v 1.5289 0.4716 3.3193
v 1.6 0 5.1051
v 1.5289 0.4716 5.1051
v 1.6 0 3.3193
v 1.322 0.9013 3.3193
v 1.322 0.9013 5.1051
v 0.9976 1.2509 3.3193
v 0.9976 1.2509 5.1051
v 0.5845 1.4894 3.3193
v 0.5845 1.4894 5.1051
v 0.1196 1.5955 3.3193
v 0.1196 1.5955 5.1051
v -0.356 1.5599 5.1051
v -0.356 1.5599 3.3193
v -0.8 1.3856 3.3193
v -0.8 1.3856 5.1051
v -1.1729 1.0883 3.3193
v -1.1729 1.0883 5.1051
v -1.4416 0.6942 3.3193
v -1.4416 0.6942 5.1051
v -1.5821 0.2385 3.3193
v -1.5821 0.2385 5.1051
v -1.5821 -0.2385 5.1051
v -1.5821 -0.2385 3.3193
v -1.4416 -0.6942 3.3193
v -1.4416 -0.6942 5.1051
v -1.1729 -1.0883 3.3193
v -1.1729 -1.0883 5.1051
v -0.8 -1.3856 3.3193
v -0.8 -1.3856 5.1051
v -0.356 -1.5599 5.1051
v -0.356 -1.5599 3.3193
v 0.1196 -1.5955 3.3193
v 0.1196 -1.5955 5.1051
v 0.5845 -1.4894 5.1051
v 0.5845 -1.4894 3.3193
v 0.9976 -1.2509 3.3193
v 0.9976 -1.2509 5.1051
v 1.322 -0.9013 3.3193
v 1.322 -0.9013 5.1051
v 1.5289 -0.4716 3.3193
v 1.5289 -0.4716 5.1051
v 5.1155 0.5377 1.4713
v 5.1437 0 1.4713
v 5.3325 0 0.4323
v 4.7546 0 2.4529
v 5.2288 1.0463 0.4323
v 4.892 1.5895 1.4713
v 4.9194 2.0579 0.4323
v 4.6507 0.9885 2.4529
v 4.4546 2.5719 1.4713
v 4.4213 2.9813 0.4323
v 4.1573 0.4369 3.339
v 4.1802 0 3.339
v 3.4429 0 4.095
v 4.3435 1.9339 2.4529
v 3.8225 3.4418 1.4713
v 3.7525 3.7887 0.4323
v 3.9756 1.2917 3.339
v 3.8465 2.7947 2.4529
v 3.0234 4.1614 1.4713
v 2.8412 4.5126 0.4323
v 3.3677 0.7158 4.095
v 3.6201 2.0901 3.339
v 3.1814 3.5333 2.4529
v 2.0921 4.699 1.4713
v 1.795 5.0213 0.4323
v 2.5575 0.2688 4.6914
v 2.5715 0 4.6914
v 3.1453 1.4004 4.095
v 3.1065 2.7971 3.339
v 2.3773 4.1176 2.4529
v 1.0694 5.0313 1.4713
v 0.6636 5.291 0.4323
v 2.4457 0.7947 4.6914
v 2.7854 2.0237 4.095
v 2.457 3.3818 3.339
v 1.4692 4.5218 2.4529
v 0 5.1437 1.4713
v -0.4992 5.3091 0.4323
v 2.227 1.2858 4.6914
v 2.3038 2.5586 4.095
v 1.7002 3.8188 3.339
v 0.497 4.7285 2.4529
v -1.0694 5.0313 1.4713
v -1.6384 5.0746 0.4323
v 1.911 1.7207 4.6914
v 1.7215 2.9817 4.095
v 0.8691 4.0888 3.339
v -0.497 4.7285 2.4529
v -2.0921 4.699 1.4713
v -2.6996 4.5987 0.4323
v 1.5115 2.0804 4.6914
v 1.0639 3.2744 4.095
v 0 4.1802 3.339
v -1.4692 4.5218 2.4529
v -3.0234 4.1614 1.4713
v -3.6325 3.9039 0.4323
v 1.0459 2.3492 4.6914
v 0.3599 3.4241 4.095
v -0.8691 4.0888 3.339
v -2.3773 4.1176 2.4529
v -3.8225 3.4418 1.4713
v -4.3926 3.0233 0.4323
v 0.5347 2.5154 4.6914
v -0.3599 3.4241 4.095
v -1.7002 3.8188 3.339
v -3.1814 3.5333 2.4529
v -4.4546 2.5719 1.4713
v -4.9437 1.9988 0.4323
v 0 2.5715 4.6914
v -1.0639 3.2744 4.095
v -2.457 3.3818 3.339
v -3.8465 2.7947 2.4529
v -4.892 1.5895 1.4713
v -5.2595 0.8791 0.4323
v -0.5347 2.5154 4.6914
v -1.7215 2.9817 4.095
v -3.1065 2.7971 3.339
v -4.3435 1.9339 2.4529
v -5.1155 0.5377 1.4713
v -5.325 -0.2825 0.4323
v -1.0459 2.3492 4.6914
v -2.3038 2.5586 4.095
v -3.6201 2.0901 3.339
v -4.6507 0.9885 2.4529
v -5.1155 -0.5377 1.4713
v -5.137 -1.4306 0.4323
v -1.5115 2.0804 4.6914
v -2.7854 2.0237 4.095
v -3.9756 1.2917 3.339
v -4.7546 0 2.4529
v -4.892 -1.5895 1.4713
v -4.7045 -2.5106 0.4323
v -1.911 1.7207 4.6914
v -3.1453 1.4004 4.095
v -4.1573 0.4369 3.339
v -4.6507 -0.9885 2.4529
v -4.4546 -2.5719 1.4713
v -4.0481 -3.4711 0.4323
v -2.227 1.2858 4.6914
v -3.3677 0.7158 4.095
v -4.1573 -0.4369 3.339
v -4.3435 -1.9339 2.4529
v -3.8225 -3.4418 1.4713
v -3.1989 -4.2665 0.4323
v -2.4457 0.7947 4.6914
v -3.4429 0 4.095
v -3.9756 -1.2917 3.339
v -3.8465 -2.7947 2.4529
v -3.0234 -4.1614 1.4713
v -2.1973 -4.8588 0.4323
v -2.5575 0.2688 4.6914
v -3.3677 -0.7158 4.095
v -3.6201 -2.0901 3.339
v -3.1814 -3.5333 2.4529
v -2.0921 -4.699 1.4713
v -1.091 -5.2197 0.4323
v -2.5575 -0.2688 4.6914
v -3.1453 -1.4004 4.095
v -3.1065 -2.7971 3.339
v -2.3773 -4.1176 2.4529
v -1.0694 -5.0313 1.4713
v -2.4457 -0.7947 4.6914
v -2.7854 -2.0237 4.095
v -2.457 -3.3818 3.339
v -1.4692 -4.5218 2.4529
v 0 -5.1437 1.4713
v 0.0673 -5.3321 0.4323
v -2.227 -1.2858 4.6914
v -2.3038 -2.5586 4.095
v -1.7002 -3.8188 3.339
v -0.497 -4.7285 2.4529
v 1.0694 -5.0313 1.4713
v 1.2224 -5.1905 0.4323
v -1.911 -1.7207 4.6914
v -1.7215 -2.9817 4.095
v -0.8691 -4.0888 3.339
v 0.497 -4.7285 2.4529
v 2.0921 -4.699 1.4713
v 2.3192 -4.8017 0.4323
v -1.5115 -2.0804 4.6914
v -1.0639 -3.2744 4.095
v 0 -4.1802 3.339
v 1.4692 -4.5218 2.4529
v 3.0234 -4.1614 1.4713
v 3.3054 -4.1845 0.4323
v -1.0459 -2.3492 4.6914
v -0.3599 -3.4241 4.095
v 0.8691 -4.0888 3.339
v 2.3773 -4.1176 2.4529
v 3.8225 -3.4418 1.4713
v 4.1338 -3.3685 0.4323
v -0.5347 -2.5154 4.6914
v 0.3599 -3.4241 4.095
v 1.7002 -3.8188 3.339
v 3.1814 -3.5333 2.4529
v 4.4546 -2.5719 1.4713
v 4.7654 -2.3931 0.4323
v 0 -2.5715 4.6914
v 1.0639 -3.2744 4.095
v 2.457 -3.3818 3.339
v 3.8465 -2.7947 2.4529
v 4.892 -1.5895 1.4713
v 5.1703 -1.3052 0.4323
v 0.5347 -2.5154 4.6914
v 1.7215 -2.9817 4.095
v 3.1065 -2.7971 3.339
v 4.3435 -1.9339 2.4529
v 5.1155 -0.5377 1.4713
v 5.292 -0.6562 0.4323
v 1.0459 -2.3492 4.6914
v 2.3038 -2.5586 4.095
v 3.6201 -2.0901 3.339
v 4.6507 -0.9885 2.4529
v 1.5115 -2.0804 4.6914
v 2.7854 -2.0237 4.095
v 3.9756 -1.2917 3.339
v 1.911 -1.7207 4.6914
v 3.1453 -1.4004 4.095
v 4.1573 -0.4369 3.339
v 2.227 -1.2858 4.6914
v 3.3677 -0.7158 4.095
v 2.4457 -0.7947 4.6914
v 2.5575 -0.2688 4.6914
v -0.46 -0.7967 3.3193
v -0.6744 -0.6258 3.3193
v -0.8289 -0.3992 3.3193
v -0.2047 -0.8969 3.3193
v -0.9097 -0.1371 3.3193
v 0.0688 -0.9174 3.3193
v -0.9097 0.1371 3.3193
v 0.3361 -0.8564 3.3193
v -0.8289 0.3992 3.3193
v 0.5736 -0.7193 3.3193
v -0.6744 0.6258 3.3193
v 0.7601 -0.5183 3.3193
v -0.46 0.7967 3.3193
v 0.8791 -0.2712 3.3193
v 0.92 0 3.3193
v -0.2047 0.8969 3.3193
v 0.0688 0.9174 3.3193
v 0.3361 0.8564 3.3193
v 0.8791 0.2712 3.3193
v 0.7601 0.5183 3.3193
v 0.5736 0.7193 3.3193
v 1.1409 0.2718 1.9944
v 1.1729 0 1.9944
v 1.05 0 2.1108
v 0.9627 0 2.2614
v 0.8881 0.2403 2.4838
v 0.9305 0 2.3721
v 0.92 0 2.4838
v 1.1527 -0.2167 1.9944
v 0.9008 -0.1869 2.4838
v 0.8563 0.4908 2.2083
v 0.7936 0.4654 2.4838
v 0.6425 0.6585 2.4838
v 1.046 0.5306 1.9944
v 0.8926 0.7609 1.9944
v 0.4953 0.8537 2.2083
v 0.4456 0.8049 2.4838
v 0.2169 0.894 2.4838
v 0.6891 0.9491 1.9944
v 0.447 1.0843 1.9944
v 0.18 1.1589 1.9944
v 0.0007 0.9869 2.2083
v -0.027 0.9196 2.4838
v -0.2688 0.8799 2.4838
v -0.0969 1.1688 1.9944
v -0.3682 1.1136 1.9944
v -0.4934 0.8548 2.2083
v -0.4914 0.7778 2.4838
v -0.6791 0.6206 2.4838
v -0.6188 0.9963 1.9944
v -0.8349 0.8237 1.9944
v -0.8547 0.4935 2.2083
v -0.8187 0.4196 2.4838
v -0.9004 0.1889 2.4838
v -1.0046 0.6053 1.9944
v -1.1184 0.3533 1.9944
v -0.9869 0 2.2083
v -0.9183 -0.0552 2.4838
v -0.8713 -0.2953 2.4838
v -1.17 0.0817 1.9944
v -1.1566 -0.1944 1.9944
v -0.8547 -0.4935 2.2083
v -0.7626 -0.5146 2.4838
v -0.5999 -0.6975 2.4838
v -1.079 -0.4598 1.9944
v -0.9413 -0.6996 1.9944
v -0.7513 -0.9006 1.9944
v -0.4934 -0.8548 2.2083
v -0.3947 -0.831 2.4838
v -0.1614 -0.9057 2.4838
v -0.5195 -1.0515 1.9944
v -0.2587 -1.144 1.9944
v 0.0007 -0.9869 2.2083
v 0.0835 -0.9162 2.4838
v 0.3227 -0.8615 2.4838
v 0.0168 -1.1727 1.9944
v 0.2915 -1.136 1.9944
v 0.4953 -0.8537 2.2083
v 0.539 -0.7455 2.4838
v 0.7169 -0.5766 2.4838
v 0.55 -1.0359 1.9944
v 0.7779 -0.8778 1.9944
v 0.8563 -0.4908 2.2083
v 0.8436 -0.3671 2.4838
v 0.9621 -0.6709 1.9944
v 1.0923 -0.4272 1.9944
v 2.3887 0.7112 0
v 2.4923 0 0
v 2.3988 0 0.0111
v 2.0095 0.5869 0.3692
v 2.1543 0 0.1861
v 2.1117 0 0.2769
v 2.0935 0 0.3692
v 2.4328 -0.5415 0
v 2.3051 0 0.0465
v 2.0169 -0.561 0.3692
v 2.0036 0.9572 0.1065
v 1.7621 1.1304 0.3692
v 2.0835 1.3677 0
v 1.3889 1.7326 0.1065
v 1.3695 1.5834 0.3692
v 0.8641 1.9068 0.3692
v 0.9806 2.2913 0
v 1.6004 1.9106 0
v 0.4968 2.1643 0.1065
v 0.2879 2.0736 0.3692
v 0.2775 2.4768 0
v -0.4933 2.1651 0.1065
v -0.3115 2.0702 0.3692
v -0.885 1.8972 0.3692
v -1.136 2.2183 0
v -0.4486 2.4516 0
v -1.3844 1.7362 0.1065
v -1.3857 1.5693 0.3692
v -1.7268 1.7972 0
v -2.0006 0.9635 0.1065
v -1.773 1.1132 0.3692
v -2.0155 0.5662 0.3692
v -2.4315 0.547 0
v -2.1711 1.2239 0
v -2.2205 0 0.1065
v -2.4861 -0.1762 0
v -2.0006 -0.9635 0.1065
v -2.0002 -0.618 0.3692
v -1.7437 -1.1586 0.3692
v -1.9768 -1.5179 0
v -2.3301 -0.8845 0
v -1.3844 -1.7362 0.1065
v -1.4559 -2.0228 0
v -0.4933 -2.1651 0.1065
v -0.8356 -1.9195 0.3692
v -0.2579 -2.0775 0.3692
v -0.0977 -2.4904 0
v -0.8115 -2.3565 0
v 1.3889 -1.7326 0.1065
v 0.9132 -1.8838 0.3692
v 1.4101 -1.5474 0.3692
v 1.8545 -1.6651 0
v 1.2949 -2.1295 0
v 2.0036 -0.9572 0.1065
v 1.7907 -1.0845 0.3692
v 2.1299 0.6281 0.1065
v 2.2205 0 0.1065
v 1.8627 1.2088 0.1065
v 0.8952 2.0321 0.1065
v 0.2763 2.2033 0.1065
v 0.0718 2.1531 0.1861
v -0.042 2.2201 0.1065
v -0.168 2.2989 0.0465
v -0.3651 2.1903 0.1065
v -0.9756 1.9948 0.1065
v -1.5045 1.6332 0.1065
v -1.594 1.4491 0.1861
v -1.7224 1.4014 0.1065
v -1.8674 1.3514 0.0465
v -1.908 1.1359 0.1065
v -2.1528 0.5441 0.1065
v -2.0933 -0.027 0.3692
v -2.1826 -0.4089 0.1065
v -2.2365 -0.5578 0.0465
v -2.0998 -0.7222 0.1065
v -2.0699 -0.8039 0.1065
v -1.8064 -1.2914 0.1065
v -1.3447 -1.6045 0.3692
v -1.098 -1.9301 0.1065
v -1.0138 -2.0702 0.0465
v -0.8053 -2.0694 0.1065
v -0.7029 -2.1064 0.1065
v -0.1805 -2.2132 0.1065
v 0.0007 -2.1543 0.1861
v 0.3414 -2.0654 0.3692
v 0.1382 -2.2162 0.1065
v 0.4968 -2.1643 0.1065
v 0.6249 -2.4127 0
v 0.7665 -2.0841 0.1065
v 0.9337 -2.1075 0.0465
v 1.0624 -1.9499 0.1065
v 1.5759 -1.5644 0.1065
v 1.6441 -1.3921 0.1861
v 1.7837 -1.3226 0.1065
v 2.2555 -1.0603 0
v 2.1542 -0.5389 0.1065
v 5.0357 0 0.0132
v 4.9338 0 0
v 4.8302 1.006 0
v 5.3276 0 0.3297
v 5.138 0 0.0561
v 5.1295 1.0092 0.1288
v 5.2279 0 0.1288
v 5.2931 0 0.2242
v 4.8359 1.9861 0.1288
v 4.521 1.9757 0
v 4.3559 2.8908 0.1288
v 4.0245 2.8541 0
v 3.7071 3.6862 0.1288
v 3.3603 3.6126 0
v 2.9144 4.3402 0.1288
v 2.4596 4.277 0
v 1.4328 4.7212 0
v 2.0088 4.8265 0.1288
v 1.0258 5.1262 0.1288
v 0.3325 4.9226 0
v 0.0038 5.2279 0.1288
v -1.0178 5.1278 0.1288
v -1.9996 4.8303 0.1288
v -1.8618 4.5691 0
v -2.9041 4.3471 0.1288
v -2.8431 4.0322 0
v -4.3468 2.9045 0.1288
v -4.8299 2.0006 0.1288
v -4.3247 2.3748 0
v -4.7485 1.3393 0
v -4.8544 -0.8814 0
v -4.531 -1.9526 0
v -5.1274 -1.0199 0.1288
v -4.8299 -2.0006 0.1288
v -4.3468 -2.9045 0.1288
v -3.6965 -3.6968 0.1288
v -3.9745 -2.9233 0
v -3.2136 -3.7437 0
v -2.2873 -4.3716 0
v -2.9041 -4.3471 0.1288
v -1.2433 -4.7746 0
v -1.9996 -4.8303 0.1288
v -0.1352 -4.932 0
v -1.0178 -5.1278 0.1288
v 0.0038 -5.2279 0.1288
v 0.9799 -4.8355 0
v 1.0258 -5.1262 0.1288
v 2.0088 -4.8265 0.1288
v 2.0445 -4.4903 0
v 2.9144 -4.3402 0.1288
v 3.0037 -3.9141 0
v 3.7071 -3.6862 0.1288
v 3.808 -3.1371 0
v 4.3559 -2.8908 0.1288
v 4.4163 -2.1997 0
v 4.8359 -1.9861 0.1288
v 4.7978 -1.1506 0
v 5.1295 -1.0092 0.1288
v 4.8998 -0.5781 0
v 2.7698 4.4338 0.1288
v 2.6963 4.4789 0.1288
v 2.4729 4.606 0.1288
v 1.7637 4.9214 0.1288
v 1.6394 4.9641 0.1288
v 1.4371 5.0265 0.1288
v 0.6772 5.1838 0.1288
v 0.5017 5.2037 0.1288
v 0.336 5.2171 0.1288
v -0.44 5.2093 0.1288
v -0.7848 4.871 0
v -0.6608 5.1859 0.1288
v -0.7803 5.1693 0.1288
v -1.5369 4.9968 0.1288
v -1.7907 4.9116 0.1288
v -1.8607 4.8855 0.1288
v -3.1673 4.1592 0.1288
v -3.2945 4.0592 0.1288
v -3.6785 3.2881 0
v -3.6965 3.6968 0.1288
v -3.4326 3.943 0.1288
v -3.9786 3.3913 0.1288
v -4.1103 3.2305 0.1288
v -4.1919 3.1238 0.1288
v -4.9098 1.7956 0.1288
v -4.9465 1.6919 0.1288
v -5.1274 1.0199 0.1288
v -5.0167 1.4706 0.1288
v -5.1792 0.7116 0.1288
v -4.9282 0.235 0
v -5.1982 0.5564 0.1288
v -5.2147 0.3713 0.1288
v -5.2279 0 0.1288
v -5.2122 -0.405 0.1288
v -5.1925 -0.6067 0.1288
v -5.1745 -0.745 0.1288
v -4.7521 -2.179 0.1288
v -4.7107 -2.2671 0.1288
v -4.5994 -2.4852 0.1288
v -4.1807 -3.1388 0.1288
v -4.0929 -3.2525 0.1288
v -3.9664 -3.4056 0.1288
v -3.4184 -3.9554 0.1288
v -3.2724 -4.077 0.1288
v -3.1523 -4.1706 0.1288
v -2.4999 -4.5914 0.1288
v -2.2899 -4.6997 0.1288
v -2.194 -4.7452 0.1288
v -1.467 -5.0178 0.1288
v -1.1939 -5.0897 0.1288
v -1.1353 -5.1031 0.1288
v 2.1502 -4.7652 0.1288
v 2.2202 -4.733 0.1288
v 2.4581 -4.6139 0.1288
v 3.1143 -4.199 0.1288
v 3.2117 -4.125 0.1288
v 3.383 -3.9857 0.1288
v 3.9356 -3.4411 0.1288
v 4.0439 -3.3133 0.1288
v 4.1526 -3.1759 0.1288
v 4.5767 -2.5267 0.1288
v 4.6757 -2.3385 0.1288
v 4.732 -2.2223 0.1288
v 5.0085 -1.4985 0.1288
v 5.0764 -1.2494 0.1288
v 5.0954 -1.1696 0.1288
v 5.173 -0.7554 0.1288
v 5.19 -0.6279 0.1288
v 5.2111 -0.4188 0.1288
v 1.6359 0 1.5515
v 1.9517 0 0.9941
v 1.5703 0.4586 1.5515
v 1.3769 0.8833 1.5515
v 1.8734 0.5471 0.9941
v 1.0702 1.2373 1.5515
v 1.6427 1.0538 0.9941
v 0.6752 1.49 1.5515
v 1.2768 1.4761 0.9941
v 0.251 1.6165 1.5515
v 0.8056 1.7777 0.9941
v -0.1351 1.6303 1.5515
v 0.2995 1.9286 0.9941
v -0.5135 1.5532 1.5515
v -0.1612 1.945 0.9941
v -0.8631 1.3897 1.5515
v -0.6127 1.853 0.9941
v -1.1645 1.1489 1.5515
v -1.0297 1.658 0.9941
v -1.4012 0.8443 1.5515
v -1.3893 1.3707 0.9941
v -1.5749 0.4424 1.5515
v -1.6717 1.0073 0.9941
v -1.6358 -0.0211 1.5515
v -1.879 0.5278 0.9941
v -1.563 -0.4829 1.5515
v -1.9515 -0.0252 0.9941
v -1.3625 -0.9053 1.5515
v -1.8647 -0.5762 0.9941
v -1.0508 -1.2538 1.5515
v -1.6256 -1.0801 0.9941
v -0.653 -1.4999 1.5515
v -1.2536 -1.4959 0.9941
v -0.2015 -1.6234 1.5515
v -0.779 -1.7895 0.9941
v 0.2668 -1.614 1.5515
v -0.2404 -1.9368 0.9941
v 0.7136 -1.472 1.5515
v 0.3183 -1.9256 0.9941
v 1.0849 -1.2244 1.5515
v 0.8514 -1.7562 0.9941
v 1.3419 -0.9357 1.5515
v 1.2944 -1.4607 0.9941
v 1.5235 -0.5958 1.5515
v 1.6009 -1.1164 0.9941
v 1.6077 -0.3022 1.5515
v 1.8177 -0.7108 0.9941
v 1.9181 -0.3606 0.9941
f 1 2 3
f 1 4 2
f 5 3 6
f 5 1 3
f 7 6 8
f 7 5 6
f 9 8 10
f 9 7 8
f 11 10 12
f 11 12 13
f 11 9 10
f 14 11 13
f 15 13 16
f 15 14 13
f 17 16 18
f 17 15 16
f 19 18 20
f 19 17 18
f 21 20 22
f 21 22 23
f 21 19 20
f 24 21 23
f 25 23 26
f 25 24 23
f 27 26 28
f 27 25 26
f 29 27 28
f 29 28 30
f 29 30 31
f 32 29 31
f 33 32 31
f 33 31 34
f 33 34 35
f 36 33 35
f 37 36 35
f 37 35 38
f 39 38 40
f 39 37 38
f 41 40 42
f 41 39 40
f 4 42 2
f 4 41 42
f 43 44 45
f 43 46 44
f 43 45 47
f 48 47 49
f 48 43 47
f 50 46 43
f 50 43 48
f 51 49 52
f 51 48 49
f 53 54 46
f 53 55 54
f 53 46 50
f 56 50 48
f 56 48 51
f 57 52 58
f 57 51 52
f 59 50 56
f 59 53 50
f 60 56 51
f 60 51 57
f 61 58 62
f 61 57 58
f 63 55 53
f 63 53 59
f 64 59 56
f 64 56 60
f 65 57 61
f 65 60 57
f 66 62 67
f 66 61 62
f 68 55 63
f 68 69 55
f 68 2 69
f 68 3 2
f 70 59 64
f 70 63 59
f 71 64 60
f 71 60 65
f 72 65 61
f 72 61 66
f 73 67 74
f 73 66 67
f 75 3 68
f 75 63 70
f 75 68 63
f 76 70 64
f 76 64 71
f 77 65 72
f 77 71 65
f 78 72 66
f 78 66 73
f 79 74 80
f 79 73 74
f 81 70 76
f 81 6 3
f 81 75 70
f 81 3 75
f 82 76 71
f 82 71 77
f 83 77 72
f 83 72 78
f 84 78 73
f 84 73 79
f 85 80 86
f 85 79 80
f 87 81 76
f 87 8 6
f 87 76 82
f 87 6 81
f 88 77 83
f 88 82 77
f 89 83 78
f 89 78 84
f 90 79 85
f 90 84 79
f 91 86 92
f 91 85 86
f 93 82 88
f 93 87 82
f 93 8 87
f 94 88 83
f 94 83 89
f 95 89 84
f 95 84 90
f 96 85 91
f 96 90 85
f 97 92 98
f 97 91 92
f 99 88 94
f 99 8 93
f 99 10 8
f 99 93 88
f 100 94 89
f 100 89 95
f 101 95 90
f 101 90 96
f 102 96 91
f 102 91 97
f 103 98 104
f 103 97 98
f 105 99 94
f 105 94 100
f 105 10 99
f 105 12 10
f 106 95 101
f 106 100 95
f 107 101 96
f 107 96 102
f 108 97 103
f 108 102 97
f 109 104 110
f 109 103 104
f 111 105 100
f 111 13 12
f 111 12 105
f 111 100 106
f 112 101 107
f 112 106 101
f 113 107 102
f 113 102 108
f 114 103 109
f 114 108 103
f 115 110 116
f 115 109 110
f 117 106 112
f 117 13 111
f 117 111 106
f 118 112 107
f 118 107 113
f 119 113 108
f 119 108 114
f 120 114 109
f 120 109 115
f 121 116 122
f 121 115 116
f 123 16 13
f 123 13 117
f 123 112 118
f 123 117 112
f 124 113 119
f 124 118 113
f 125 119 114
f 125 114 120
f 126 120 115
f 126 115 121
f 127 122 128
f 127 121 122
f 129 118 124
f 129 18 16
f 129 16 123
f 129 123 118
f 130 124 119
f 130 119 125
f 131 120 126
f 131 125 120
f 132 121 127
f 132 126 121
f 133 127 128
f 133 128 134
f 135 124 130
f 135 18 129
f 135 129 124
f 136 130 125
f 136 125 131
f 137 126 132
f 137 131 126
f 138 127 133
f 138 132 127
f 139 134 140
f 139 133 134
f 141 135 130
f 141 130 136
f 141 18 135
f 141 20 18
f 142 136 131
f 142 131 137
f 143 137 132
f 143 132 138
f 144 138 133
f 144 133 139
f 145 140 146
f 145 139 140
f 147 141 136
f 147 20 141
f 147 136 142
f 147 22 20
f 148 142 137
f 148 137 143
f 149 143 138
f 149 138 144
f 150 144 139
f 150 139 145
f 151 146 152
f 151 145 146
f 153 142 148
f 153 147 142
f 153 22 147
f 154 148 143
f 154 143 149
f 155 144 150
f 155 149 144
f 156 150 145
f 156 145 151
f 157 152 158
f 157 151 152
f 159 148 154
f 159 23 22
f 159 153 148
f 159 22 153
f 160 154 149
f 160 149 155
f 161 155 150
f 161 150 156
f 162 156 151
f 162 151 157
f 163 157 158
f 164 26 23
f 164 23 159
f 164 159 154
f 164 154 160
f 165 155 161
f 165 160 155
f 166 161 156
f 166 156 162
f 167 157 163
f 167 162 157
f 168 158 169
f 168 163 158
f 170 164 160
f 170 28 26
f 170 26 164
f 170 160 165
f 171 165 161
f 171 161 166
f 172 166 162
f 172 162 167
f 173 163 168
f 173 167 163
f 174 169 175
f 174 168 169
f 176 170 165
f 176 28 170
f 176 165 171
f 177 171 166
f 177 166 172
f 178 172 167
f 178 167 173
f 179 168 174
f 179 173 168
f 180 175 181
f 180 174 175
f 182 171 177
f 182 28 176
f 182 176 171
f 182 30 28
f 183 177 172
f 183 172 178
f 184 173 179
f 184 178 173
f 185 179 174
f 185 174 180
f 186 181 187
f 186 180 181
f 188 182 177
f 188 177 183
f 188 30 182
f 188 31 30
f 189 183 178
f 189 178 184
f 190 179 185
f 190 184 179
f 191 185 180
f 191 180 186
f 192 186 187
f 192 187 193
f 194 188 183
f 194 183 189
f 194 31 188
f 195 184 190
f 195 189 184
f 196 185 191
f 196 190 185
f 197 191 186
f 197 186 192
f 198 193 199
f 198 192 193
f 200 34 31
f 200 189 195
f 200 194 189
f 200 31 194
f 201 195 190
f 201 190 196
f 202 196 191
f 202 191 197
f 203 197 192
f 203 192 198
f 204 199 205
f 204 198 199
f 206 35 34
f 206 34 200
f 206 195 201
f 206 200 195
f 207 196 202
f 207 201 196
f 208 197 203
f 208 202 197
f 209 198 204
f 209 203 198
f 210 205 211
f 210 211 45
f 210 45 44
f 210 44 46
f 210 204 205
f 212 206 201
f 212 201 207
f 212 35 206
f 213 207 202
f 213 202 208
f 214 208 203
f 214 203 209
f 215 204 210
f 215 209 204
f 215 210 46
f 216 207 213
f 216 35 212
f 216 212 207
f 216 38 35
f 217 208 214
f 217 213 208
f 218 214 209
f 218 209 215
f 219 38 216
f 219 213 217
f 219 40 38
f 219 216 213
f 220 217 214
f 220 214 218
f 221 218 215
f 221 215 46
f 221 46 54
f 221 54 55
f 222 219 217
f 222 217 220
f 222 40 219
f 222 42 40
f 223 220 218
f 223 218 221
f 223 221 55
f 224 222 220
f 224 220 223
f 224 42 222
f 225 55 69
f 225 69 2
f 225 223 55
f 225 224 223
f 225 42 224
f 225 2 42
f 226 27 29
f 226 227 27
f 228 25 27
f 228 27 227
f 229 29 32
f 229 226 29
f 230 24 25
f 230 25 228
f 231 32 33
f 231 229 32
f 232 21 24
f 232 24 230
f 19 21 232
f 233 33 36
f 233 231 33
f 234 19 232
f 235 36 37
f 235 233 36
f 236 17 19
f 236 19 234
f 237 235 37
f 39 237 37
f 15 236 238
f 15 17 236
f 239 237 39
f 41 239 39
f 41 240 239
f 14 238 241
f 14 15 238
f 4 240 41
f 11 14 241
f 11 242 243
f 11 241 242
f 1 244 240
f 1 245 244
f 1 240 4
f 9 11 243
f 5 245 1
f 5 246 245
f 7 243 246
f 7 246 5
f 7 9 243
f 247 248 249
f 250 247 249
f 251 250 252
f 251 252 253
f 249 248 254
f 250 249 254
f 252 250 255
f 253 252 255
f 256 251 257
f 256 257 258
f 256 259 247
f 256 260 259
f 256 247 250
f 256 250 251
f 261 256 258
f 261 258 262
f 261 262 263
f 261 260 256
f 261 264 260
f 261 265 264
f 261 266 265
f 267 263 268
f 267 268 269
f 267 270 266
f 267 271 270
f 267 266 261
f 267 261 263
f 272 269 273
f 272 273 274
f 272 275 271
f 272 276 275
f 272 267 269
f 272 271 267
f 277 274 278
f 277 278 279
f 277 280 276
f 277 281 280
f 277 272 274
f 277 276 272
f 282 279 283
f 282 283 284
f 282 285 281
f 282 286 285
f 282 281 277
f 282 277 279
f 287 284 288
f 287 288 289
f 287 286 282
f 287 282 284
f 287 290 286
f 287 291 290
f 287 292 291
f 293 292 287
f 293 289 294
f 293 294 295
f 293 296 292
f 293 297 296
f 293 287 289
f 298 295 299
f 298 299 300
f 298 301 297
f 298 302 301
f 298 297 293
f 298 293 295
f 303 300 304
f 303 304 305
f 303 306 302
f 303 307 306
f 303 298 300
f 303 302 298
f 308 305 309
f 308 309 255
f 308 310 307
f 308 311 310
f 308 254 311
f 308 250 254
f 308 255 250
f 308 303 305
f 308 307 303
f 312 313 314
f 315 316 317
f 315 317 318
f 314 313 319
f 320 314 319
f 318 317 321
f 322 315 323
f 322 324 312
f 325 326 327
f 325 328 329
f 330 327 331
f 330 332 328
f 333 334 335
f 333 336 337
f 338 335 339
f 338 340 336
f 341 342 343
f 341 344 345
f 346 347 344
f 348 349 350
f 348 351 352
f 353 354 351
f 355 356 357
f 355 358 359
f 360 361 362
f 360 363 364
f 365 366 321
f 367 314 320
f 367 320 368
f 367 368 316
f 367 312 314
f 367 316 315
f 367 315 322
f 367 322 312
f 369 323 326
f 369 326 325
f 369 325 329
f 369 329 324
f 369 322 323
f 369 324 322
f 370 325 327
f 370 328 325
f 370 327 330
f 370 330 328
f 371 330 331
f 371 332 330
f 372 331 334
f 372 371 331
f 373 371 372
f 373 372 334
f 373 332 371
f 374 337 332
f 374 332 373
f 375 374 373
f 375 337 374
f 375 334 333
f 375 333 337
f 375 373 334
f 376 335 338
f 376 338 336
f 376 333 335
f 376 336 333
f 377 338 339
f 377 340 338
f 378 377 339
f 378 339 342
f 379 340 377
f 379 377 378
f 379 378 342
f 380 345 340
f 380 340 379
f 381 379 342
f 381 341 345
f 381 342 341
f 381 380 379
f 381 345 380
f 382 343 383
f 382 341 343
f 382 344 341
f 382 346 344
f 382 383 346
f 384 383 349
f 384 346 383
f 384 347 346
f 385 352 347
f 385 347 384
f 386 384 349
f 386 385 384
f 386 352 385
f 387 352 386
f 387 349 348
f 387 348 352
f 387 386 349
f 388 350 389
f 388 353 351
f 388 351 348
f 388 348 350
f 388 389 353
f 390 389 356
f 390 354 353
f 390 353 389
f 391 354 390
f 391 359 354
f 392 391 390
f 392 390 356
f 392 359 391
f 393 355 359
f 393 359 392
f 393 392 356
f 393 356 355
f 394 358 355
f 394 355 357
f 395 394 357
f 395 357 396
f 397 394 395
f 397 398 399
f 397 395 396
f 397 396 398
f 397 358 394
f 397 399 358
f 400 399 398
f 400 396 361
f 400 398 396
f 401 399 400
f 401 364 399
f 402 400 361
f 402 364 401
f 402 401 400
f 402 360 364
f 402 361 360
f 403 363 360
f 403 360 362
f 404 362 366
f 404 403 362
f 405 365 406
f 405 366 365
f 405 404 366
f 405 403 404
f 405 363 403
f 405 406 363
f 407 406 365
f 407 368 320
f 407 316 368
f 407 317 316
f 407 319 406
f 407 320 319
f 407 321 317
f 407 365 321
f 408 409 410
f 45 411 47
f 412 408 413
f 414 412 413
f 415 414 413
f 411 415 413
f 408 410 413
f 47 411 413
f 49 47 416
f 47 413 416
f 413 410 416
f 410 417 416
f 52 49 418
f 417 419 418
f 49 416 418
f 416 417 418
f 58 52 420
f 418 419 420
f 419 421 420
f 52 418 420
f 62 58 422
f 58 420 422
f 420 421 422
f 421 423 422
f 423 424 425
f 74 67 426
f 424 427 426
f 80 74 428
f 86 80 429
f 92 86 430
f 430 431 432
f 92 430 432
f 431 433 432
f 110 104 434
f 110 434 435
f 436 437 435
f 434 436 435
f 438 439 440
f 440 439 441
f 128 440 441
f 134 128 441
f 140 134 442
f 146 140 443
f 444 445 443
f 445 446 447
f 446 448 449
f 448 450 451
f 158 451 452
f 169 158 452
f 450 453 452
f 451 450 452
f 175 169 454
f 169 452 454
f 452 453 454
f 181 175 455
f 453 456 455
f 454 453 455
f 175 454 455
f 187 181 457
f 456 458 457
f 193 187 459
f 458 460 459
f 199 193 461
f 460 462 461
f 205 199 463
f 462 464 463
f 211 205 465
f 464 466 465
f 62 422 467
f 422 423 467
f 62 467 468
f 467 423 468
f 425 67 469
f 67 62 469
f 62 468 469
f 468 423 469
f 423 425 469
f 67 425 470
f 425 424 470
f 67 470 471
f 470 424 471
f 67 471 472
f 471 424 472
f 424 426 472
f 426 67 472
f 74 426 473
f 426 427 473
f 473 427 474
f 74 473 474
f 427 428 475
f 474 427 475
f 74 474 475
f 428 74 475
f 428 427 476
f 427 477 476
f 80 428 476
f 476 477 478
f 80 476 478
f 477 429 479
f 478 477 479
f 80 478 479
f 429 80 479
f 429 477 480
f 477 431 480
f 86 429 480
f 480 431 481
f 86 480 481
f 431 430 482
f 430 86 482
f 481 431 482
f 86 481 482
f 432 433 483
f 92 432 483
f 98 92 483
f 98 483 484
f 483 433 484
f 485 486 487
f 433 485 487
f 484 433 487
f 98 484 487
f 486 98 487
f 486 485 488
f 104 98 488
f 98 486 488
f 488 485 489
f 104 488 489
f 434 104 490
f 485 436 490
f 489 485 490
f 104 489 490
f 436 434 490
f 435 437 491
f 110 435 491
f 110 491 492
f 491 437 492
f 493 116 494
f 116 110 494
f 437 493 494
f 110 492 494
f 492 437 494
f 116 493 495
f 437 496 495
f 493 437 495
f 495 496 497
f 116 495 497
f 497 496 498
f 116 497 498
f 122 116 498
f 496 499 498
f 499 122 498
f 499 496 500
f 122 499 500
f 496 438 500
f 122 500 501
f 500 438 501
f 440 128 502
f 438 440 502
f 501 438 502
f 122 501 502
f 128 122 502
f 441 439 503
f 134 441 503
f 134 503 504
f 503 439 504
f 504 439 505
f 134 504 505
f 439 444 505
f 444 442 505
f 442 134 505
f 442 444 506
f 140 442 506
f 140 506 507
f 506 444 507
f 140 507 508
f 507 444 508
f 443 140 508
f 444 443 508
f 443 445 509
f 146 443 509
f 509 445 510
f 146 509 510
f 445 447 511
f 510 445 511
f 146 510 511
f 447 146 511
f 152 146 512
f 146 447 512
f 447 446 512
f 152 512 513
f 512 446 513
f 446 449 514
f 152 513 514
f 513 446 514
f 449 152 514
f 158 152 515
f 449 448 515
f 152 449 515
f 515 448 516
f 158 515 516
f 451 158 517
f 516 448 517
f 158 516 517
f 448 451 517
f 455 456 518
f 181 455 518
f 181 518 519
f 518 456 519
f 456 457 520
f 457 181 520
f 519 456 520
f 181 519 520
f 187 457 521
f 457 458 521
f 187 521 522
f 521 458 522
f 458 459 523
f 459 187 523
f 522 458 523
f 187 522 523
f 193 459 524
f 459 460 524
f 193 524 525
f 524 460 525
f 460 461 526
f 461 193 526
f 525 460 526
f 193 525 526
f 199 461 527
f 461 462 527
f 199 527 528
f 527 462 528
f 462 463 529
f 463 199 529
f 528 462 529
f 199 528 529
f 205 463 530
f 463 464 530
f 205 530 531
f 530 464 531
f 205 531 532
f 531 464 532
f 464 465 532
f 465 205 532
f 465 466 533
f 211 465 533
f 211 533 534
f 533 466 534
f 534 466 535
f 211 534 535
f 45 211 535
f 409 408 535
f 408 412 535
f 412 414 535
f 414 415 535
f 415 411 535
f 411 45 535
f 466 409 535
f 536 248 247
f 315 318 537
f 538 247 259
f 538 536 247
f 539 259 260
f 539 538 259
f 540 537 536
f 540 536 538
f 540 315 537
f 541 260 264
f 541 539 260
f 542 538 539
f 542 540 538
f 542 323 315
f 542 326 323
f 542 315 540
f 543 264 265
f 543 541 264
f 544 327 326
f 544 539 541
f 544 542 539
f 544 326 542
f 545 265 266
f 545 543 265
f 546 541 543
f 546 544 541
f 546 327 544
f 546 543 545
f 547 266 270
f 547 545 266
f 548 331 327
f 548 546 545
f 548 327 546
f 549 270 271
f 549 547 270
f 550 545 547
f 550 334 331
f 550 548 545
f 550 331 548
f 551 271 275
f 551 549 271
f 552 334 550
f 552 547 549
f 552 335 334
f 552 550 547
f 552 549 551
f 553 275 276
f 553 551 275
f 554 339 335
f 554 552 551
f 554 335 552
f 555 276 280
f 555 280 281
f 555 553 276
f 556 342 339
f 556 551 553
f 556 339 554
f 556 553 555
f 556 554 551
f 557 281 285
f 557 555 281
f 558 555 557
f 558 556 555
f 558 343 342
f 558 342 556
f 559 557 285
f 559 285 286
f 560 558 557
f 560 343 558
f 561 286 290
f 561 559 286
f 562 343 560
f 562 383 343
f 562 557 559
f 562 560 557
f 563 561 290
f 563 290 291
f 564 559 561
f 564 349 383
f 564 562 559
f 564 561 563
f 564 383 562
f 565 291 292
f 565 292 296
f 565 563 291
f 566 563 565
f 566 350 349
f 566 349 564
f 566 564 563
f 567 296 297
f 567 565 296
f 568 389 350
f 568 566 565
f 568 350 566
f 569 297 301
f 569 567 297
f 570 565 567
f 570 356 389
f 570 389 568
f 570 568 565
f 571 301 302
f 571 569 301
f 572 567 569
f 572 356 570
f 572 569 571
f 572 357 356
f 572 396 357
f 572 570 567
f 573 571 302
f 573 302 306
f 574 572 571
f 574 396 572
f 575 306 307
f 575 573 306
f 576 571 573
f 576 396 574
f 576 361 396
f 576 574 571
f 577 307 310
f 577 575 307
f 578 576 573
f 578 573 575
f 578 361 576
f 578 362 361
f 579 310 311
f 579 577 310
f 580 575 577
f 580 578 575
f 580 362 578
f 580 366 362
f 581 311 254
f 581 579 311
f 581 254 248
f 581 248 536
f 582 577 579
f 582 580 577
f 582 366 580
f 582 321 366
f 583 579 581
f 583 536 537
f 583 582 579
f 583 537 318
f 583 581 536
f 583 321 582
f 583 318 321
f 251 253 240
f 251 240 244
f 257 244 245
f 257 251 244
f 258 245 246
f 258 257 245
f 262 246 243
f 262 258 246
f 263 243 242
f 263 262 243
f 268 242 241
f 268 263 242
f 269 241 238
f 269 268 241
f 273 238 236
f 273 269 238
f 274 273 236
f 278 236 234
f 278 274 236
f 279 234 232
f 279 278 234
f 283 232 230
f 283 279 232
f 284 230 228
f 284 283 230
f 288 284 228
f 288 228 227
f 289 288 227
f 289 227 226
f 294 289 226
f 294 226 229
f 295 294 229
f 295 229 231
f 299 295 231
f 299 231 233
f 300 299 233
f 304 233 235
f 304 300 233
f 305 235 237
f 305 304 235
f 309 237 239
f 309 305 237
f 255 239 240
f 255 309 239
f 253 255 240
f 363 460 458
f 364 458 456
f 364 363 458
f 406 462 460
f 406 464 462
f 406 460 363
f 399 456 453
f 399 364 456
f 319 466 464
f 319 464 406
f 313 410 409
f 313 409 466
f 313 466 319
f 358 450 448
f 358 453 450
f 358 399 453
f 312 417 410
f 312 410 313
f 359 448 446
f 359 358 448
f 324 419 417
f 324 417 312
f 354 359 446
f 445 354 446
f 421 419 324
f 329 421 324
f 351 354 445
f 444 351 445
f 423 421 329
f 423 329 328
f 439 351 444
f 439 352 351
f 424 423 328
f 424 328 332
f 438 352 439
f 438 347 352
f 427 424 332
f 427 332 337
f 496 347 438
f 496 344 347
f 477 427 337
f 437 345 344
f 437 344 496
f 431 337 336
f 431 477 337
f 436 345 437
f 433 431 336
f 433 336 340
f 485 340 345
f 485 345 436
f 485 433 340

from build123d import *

# Parameters (mm, degrees)
BOTTOM_FILLET_R = 0.4
FILLET1_R       = 0.6


with BuildPart() as part:
    # Sketch2 → Main Body (revolve)
    with BuildSketch(Plane(origin=(0, 0, 0), x_dir=(1, 0, 0), z_dir=(0, 1, 0))):
        with BuildLine():
            Line((2.1, 0), (5.35, 0))
            ThreePointArc((5.35, 0), (4.311757182, -3.167214865), (1.6, -5.105144464))
            Line((1.6, -5.105144464), (1.6, -3.319256268))
            Line((1.6, -3.319256268), (0.92, -3.319256268))
            Line((0.92, -3.319256268), (0.92, -2.149256268))
            ThreePointArc((0.92, -2.149256268), (1.782020191, -1.339298029), (2.1, -0.2))
            Line((2.1, -0.2), (2.1, 0))
        make_face()
    revolve(axis=Axis((0, 0, 0), (0, 0, 1)))

    # Bottom Fillet
    bottom_fillet_edges = [part.edges().sort_by_distance(p)[0] for p in [
        (-5.35, 0, 0),
        (-2.1, 0, 0),
    ]]
    fillet(bottom_fillet_edges, radius=BOTTOM_FILLET_R)

    # Fillet1
    fillet1_edges = [part.edges().sort_by_distance(p)[0] for p in [
        (-0.92, 0, 2.149256268),
    ]]
    fillet(fillet1_edges, radius=FILLET1_R)


solid = part.part
